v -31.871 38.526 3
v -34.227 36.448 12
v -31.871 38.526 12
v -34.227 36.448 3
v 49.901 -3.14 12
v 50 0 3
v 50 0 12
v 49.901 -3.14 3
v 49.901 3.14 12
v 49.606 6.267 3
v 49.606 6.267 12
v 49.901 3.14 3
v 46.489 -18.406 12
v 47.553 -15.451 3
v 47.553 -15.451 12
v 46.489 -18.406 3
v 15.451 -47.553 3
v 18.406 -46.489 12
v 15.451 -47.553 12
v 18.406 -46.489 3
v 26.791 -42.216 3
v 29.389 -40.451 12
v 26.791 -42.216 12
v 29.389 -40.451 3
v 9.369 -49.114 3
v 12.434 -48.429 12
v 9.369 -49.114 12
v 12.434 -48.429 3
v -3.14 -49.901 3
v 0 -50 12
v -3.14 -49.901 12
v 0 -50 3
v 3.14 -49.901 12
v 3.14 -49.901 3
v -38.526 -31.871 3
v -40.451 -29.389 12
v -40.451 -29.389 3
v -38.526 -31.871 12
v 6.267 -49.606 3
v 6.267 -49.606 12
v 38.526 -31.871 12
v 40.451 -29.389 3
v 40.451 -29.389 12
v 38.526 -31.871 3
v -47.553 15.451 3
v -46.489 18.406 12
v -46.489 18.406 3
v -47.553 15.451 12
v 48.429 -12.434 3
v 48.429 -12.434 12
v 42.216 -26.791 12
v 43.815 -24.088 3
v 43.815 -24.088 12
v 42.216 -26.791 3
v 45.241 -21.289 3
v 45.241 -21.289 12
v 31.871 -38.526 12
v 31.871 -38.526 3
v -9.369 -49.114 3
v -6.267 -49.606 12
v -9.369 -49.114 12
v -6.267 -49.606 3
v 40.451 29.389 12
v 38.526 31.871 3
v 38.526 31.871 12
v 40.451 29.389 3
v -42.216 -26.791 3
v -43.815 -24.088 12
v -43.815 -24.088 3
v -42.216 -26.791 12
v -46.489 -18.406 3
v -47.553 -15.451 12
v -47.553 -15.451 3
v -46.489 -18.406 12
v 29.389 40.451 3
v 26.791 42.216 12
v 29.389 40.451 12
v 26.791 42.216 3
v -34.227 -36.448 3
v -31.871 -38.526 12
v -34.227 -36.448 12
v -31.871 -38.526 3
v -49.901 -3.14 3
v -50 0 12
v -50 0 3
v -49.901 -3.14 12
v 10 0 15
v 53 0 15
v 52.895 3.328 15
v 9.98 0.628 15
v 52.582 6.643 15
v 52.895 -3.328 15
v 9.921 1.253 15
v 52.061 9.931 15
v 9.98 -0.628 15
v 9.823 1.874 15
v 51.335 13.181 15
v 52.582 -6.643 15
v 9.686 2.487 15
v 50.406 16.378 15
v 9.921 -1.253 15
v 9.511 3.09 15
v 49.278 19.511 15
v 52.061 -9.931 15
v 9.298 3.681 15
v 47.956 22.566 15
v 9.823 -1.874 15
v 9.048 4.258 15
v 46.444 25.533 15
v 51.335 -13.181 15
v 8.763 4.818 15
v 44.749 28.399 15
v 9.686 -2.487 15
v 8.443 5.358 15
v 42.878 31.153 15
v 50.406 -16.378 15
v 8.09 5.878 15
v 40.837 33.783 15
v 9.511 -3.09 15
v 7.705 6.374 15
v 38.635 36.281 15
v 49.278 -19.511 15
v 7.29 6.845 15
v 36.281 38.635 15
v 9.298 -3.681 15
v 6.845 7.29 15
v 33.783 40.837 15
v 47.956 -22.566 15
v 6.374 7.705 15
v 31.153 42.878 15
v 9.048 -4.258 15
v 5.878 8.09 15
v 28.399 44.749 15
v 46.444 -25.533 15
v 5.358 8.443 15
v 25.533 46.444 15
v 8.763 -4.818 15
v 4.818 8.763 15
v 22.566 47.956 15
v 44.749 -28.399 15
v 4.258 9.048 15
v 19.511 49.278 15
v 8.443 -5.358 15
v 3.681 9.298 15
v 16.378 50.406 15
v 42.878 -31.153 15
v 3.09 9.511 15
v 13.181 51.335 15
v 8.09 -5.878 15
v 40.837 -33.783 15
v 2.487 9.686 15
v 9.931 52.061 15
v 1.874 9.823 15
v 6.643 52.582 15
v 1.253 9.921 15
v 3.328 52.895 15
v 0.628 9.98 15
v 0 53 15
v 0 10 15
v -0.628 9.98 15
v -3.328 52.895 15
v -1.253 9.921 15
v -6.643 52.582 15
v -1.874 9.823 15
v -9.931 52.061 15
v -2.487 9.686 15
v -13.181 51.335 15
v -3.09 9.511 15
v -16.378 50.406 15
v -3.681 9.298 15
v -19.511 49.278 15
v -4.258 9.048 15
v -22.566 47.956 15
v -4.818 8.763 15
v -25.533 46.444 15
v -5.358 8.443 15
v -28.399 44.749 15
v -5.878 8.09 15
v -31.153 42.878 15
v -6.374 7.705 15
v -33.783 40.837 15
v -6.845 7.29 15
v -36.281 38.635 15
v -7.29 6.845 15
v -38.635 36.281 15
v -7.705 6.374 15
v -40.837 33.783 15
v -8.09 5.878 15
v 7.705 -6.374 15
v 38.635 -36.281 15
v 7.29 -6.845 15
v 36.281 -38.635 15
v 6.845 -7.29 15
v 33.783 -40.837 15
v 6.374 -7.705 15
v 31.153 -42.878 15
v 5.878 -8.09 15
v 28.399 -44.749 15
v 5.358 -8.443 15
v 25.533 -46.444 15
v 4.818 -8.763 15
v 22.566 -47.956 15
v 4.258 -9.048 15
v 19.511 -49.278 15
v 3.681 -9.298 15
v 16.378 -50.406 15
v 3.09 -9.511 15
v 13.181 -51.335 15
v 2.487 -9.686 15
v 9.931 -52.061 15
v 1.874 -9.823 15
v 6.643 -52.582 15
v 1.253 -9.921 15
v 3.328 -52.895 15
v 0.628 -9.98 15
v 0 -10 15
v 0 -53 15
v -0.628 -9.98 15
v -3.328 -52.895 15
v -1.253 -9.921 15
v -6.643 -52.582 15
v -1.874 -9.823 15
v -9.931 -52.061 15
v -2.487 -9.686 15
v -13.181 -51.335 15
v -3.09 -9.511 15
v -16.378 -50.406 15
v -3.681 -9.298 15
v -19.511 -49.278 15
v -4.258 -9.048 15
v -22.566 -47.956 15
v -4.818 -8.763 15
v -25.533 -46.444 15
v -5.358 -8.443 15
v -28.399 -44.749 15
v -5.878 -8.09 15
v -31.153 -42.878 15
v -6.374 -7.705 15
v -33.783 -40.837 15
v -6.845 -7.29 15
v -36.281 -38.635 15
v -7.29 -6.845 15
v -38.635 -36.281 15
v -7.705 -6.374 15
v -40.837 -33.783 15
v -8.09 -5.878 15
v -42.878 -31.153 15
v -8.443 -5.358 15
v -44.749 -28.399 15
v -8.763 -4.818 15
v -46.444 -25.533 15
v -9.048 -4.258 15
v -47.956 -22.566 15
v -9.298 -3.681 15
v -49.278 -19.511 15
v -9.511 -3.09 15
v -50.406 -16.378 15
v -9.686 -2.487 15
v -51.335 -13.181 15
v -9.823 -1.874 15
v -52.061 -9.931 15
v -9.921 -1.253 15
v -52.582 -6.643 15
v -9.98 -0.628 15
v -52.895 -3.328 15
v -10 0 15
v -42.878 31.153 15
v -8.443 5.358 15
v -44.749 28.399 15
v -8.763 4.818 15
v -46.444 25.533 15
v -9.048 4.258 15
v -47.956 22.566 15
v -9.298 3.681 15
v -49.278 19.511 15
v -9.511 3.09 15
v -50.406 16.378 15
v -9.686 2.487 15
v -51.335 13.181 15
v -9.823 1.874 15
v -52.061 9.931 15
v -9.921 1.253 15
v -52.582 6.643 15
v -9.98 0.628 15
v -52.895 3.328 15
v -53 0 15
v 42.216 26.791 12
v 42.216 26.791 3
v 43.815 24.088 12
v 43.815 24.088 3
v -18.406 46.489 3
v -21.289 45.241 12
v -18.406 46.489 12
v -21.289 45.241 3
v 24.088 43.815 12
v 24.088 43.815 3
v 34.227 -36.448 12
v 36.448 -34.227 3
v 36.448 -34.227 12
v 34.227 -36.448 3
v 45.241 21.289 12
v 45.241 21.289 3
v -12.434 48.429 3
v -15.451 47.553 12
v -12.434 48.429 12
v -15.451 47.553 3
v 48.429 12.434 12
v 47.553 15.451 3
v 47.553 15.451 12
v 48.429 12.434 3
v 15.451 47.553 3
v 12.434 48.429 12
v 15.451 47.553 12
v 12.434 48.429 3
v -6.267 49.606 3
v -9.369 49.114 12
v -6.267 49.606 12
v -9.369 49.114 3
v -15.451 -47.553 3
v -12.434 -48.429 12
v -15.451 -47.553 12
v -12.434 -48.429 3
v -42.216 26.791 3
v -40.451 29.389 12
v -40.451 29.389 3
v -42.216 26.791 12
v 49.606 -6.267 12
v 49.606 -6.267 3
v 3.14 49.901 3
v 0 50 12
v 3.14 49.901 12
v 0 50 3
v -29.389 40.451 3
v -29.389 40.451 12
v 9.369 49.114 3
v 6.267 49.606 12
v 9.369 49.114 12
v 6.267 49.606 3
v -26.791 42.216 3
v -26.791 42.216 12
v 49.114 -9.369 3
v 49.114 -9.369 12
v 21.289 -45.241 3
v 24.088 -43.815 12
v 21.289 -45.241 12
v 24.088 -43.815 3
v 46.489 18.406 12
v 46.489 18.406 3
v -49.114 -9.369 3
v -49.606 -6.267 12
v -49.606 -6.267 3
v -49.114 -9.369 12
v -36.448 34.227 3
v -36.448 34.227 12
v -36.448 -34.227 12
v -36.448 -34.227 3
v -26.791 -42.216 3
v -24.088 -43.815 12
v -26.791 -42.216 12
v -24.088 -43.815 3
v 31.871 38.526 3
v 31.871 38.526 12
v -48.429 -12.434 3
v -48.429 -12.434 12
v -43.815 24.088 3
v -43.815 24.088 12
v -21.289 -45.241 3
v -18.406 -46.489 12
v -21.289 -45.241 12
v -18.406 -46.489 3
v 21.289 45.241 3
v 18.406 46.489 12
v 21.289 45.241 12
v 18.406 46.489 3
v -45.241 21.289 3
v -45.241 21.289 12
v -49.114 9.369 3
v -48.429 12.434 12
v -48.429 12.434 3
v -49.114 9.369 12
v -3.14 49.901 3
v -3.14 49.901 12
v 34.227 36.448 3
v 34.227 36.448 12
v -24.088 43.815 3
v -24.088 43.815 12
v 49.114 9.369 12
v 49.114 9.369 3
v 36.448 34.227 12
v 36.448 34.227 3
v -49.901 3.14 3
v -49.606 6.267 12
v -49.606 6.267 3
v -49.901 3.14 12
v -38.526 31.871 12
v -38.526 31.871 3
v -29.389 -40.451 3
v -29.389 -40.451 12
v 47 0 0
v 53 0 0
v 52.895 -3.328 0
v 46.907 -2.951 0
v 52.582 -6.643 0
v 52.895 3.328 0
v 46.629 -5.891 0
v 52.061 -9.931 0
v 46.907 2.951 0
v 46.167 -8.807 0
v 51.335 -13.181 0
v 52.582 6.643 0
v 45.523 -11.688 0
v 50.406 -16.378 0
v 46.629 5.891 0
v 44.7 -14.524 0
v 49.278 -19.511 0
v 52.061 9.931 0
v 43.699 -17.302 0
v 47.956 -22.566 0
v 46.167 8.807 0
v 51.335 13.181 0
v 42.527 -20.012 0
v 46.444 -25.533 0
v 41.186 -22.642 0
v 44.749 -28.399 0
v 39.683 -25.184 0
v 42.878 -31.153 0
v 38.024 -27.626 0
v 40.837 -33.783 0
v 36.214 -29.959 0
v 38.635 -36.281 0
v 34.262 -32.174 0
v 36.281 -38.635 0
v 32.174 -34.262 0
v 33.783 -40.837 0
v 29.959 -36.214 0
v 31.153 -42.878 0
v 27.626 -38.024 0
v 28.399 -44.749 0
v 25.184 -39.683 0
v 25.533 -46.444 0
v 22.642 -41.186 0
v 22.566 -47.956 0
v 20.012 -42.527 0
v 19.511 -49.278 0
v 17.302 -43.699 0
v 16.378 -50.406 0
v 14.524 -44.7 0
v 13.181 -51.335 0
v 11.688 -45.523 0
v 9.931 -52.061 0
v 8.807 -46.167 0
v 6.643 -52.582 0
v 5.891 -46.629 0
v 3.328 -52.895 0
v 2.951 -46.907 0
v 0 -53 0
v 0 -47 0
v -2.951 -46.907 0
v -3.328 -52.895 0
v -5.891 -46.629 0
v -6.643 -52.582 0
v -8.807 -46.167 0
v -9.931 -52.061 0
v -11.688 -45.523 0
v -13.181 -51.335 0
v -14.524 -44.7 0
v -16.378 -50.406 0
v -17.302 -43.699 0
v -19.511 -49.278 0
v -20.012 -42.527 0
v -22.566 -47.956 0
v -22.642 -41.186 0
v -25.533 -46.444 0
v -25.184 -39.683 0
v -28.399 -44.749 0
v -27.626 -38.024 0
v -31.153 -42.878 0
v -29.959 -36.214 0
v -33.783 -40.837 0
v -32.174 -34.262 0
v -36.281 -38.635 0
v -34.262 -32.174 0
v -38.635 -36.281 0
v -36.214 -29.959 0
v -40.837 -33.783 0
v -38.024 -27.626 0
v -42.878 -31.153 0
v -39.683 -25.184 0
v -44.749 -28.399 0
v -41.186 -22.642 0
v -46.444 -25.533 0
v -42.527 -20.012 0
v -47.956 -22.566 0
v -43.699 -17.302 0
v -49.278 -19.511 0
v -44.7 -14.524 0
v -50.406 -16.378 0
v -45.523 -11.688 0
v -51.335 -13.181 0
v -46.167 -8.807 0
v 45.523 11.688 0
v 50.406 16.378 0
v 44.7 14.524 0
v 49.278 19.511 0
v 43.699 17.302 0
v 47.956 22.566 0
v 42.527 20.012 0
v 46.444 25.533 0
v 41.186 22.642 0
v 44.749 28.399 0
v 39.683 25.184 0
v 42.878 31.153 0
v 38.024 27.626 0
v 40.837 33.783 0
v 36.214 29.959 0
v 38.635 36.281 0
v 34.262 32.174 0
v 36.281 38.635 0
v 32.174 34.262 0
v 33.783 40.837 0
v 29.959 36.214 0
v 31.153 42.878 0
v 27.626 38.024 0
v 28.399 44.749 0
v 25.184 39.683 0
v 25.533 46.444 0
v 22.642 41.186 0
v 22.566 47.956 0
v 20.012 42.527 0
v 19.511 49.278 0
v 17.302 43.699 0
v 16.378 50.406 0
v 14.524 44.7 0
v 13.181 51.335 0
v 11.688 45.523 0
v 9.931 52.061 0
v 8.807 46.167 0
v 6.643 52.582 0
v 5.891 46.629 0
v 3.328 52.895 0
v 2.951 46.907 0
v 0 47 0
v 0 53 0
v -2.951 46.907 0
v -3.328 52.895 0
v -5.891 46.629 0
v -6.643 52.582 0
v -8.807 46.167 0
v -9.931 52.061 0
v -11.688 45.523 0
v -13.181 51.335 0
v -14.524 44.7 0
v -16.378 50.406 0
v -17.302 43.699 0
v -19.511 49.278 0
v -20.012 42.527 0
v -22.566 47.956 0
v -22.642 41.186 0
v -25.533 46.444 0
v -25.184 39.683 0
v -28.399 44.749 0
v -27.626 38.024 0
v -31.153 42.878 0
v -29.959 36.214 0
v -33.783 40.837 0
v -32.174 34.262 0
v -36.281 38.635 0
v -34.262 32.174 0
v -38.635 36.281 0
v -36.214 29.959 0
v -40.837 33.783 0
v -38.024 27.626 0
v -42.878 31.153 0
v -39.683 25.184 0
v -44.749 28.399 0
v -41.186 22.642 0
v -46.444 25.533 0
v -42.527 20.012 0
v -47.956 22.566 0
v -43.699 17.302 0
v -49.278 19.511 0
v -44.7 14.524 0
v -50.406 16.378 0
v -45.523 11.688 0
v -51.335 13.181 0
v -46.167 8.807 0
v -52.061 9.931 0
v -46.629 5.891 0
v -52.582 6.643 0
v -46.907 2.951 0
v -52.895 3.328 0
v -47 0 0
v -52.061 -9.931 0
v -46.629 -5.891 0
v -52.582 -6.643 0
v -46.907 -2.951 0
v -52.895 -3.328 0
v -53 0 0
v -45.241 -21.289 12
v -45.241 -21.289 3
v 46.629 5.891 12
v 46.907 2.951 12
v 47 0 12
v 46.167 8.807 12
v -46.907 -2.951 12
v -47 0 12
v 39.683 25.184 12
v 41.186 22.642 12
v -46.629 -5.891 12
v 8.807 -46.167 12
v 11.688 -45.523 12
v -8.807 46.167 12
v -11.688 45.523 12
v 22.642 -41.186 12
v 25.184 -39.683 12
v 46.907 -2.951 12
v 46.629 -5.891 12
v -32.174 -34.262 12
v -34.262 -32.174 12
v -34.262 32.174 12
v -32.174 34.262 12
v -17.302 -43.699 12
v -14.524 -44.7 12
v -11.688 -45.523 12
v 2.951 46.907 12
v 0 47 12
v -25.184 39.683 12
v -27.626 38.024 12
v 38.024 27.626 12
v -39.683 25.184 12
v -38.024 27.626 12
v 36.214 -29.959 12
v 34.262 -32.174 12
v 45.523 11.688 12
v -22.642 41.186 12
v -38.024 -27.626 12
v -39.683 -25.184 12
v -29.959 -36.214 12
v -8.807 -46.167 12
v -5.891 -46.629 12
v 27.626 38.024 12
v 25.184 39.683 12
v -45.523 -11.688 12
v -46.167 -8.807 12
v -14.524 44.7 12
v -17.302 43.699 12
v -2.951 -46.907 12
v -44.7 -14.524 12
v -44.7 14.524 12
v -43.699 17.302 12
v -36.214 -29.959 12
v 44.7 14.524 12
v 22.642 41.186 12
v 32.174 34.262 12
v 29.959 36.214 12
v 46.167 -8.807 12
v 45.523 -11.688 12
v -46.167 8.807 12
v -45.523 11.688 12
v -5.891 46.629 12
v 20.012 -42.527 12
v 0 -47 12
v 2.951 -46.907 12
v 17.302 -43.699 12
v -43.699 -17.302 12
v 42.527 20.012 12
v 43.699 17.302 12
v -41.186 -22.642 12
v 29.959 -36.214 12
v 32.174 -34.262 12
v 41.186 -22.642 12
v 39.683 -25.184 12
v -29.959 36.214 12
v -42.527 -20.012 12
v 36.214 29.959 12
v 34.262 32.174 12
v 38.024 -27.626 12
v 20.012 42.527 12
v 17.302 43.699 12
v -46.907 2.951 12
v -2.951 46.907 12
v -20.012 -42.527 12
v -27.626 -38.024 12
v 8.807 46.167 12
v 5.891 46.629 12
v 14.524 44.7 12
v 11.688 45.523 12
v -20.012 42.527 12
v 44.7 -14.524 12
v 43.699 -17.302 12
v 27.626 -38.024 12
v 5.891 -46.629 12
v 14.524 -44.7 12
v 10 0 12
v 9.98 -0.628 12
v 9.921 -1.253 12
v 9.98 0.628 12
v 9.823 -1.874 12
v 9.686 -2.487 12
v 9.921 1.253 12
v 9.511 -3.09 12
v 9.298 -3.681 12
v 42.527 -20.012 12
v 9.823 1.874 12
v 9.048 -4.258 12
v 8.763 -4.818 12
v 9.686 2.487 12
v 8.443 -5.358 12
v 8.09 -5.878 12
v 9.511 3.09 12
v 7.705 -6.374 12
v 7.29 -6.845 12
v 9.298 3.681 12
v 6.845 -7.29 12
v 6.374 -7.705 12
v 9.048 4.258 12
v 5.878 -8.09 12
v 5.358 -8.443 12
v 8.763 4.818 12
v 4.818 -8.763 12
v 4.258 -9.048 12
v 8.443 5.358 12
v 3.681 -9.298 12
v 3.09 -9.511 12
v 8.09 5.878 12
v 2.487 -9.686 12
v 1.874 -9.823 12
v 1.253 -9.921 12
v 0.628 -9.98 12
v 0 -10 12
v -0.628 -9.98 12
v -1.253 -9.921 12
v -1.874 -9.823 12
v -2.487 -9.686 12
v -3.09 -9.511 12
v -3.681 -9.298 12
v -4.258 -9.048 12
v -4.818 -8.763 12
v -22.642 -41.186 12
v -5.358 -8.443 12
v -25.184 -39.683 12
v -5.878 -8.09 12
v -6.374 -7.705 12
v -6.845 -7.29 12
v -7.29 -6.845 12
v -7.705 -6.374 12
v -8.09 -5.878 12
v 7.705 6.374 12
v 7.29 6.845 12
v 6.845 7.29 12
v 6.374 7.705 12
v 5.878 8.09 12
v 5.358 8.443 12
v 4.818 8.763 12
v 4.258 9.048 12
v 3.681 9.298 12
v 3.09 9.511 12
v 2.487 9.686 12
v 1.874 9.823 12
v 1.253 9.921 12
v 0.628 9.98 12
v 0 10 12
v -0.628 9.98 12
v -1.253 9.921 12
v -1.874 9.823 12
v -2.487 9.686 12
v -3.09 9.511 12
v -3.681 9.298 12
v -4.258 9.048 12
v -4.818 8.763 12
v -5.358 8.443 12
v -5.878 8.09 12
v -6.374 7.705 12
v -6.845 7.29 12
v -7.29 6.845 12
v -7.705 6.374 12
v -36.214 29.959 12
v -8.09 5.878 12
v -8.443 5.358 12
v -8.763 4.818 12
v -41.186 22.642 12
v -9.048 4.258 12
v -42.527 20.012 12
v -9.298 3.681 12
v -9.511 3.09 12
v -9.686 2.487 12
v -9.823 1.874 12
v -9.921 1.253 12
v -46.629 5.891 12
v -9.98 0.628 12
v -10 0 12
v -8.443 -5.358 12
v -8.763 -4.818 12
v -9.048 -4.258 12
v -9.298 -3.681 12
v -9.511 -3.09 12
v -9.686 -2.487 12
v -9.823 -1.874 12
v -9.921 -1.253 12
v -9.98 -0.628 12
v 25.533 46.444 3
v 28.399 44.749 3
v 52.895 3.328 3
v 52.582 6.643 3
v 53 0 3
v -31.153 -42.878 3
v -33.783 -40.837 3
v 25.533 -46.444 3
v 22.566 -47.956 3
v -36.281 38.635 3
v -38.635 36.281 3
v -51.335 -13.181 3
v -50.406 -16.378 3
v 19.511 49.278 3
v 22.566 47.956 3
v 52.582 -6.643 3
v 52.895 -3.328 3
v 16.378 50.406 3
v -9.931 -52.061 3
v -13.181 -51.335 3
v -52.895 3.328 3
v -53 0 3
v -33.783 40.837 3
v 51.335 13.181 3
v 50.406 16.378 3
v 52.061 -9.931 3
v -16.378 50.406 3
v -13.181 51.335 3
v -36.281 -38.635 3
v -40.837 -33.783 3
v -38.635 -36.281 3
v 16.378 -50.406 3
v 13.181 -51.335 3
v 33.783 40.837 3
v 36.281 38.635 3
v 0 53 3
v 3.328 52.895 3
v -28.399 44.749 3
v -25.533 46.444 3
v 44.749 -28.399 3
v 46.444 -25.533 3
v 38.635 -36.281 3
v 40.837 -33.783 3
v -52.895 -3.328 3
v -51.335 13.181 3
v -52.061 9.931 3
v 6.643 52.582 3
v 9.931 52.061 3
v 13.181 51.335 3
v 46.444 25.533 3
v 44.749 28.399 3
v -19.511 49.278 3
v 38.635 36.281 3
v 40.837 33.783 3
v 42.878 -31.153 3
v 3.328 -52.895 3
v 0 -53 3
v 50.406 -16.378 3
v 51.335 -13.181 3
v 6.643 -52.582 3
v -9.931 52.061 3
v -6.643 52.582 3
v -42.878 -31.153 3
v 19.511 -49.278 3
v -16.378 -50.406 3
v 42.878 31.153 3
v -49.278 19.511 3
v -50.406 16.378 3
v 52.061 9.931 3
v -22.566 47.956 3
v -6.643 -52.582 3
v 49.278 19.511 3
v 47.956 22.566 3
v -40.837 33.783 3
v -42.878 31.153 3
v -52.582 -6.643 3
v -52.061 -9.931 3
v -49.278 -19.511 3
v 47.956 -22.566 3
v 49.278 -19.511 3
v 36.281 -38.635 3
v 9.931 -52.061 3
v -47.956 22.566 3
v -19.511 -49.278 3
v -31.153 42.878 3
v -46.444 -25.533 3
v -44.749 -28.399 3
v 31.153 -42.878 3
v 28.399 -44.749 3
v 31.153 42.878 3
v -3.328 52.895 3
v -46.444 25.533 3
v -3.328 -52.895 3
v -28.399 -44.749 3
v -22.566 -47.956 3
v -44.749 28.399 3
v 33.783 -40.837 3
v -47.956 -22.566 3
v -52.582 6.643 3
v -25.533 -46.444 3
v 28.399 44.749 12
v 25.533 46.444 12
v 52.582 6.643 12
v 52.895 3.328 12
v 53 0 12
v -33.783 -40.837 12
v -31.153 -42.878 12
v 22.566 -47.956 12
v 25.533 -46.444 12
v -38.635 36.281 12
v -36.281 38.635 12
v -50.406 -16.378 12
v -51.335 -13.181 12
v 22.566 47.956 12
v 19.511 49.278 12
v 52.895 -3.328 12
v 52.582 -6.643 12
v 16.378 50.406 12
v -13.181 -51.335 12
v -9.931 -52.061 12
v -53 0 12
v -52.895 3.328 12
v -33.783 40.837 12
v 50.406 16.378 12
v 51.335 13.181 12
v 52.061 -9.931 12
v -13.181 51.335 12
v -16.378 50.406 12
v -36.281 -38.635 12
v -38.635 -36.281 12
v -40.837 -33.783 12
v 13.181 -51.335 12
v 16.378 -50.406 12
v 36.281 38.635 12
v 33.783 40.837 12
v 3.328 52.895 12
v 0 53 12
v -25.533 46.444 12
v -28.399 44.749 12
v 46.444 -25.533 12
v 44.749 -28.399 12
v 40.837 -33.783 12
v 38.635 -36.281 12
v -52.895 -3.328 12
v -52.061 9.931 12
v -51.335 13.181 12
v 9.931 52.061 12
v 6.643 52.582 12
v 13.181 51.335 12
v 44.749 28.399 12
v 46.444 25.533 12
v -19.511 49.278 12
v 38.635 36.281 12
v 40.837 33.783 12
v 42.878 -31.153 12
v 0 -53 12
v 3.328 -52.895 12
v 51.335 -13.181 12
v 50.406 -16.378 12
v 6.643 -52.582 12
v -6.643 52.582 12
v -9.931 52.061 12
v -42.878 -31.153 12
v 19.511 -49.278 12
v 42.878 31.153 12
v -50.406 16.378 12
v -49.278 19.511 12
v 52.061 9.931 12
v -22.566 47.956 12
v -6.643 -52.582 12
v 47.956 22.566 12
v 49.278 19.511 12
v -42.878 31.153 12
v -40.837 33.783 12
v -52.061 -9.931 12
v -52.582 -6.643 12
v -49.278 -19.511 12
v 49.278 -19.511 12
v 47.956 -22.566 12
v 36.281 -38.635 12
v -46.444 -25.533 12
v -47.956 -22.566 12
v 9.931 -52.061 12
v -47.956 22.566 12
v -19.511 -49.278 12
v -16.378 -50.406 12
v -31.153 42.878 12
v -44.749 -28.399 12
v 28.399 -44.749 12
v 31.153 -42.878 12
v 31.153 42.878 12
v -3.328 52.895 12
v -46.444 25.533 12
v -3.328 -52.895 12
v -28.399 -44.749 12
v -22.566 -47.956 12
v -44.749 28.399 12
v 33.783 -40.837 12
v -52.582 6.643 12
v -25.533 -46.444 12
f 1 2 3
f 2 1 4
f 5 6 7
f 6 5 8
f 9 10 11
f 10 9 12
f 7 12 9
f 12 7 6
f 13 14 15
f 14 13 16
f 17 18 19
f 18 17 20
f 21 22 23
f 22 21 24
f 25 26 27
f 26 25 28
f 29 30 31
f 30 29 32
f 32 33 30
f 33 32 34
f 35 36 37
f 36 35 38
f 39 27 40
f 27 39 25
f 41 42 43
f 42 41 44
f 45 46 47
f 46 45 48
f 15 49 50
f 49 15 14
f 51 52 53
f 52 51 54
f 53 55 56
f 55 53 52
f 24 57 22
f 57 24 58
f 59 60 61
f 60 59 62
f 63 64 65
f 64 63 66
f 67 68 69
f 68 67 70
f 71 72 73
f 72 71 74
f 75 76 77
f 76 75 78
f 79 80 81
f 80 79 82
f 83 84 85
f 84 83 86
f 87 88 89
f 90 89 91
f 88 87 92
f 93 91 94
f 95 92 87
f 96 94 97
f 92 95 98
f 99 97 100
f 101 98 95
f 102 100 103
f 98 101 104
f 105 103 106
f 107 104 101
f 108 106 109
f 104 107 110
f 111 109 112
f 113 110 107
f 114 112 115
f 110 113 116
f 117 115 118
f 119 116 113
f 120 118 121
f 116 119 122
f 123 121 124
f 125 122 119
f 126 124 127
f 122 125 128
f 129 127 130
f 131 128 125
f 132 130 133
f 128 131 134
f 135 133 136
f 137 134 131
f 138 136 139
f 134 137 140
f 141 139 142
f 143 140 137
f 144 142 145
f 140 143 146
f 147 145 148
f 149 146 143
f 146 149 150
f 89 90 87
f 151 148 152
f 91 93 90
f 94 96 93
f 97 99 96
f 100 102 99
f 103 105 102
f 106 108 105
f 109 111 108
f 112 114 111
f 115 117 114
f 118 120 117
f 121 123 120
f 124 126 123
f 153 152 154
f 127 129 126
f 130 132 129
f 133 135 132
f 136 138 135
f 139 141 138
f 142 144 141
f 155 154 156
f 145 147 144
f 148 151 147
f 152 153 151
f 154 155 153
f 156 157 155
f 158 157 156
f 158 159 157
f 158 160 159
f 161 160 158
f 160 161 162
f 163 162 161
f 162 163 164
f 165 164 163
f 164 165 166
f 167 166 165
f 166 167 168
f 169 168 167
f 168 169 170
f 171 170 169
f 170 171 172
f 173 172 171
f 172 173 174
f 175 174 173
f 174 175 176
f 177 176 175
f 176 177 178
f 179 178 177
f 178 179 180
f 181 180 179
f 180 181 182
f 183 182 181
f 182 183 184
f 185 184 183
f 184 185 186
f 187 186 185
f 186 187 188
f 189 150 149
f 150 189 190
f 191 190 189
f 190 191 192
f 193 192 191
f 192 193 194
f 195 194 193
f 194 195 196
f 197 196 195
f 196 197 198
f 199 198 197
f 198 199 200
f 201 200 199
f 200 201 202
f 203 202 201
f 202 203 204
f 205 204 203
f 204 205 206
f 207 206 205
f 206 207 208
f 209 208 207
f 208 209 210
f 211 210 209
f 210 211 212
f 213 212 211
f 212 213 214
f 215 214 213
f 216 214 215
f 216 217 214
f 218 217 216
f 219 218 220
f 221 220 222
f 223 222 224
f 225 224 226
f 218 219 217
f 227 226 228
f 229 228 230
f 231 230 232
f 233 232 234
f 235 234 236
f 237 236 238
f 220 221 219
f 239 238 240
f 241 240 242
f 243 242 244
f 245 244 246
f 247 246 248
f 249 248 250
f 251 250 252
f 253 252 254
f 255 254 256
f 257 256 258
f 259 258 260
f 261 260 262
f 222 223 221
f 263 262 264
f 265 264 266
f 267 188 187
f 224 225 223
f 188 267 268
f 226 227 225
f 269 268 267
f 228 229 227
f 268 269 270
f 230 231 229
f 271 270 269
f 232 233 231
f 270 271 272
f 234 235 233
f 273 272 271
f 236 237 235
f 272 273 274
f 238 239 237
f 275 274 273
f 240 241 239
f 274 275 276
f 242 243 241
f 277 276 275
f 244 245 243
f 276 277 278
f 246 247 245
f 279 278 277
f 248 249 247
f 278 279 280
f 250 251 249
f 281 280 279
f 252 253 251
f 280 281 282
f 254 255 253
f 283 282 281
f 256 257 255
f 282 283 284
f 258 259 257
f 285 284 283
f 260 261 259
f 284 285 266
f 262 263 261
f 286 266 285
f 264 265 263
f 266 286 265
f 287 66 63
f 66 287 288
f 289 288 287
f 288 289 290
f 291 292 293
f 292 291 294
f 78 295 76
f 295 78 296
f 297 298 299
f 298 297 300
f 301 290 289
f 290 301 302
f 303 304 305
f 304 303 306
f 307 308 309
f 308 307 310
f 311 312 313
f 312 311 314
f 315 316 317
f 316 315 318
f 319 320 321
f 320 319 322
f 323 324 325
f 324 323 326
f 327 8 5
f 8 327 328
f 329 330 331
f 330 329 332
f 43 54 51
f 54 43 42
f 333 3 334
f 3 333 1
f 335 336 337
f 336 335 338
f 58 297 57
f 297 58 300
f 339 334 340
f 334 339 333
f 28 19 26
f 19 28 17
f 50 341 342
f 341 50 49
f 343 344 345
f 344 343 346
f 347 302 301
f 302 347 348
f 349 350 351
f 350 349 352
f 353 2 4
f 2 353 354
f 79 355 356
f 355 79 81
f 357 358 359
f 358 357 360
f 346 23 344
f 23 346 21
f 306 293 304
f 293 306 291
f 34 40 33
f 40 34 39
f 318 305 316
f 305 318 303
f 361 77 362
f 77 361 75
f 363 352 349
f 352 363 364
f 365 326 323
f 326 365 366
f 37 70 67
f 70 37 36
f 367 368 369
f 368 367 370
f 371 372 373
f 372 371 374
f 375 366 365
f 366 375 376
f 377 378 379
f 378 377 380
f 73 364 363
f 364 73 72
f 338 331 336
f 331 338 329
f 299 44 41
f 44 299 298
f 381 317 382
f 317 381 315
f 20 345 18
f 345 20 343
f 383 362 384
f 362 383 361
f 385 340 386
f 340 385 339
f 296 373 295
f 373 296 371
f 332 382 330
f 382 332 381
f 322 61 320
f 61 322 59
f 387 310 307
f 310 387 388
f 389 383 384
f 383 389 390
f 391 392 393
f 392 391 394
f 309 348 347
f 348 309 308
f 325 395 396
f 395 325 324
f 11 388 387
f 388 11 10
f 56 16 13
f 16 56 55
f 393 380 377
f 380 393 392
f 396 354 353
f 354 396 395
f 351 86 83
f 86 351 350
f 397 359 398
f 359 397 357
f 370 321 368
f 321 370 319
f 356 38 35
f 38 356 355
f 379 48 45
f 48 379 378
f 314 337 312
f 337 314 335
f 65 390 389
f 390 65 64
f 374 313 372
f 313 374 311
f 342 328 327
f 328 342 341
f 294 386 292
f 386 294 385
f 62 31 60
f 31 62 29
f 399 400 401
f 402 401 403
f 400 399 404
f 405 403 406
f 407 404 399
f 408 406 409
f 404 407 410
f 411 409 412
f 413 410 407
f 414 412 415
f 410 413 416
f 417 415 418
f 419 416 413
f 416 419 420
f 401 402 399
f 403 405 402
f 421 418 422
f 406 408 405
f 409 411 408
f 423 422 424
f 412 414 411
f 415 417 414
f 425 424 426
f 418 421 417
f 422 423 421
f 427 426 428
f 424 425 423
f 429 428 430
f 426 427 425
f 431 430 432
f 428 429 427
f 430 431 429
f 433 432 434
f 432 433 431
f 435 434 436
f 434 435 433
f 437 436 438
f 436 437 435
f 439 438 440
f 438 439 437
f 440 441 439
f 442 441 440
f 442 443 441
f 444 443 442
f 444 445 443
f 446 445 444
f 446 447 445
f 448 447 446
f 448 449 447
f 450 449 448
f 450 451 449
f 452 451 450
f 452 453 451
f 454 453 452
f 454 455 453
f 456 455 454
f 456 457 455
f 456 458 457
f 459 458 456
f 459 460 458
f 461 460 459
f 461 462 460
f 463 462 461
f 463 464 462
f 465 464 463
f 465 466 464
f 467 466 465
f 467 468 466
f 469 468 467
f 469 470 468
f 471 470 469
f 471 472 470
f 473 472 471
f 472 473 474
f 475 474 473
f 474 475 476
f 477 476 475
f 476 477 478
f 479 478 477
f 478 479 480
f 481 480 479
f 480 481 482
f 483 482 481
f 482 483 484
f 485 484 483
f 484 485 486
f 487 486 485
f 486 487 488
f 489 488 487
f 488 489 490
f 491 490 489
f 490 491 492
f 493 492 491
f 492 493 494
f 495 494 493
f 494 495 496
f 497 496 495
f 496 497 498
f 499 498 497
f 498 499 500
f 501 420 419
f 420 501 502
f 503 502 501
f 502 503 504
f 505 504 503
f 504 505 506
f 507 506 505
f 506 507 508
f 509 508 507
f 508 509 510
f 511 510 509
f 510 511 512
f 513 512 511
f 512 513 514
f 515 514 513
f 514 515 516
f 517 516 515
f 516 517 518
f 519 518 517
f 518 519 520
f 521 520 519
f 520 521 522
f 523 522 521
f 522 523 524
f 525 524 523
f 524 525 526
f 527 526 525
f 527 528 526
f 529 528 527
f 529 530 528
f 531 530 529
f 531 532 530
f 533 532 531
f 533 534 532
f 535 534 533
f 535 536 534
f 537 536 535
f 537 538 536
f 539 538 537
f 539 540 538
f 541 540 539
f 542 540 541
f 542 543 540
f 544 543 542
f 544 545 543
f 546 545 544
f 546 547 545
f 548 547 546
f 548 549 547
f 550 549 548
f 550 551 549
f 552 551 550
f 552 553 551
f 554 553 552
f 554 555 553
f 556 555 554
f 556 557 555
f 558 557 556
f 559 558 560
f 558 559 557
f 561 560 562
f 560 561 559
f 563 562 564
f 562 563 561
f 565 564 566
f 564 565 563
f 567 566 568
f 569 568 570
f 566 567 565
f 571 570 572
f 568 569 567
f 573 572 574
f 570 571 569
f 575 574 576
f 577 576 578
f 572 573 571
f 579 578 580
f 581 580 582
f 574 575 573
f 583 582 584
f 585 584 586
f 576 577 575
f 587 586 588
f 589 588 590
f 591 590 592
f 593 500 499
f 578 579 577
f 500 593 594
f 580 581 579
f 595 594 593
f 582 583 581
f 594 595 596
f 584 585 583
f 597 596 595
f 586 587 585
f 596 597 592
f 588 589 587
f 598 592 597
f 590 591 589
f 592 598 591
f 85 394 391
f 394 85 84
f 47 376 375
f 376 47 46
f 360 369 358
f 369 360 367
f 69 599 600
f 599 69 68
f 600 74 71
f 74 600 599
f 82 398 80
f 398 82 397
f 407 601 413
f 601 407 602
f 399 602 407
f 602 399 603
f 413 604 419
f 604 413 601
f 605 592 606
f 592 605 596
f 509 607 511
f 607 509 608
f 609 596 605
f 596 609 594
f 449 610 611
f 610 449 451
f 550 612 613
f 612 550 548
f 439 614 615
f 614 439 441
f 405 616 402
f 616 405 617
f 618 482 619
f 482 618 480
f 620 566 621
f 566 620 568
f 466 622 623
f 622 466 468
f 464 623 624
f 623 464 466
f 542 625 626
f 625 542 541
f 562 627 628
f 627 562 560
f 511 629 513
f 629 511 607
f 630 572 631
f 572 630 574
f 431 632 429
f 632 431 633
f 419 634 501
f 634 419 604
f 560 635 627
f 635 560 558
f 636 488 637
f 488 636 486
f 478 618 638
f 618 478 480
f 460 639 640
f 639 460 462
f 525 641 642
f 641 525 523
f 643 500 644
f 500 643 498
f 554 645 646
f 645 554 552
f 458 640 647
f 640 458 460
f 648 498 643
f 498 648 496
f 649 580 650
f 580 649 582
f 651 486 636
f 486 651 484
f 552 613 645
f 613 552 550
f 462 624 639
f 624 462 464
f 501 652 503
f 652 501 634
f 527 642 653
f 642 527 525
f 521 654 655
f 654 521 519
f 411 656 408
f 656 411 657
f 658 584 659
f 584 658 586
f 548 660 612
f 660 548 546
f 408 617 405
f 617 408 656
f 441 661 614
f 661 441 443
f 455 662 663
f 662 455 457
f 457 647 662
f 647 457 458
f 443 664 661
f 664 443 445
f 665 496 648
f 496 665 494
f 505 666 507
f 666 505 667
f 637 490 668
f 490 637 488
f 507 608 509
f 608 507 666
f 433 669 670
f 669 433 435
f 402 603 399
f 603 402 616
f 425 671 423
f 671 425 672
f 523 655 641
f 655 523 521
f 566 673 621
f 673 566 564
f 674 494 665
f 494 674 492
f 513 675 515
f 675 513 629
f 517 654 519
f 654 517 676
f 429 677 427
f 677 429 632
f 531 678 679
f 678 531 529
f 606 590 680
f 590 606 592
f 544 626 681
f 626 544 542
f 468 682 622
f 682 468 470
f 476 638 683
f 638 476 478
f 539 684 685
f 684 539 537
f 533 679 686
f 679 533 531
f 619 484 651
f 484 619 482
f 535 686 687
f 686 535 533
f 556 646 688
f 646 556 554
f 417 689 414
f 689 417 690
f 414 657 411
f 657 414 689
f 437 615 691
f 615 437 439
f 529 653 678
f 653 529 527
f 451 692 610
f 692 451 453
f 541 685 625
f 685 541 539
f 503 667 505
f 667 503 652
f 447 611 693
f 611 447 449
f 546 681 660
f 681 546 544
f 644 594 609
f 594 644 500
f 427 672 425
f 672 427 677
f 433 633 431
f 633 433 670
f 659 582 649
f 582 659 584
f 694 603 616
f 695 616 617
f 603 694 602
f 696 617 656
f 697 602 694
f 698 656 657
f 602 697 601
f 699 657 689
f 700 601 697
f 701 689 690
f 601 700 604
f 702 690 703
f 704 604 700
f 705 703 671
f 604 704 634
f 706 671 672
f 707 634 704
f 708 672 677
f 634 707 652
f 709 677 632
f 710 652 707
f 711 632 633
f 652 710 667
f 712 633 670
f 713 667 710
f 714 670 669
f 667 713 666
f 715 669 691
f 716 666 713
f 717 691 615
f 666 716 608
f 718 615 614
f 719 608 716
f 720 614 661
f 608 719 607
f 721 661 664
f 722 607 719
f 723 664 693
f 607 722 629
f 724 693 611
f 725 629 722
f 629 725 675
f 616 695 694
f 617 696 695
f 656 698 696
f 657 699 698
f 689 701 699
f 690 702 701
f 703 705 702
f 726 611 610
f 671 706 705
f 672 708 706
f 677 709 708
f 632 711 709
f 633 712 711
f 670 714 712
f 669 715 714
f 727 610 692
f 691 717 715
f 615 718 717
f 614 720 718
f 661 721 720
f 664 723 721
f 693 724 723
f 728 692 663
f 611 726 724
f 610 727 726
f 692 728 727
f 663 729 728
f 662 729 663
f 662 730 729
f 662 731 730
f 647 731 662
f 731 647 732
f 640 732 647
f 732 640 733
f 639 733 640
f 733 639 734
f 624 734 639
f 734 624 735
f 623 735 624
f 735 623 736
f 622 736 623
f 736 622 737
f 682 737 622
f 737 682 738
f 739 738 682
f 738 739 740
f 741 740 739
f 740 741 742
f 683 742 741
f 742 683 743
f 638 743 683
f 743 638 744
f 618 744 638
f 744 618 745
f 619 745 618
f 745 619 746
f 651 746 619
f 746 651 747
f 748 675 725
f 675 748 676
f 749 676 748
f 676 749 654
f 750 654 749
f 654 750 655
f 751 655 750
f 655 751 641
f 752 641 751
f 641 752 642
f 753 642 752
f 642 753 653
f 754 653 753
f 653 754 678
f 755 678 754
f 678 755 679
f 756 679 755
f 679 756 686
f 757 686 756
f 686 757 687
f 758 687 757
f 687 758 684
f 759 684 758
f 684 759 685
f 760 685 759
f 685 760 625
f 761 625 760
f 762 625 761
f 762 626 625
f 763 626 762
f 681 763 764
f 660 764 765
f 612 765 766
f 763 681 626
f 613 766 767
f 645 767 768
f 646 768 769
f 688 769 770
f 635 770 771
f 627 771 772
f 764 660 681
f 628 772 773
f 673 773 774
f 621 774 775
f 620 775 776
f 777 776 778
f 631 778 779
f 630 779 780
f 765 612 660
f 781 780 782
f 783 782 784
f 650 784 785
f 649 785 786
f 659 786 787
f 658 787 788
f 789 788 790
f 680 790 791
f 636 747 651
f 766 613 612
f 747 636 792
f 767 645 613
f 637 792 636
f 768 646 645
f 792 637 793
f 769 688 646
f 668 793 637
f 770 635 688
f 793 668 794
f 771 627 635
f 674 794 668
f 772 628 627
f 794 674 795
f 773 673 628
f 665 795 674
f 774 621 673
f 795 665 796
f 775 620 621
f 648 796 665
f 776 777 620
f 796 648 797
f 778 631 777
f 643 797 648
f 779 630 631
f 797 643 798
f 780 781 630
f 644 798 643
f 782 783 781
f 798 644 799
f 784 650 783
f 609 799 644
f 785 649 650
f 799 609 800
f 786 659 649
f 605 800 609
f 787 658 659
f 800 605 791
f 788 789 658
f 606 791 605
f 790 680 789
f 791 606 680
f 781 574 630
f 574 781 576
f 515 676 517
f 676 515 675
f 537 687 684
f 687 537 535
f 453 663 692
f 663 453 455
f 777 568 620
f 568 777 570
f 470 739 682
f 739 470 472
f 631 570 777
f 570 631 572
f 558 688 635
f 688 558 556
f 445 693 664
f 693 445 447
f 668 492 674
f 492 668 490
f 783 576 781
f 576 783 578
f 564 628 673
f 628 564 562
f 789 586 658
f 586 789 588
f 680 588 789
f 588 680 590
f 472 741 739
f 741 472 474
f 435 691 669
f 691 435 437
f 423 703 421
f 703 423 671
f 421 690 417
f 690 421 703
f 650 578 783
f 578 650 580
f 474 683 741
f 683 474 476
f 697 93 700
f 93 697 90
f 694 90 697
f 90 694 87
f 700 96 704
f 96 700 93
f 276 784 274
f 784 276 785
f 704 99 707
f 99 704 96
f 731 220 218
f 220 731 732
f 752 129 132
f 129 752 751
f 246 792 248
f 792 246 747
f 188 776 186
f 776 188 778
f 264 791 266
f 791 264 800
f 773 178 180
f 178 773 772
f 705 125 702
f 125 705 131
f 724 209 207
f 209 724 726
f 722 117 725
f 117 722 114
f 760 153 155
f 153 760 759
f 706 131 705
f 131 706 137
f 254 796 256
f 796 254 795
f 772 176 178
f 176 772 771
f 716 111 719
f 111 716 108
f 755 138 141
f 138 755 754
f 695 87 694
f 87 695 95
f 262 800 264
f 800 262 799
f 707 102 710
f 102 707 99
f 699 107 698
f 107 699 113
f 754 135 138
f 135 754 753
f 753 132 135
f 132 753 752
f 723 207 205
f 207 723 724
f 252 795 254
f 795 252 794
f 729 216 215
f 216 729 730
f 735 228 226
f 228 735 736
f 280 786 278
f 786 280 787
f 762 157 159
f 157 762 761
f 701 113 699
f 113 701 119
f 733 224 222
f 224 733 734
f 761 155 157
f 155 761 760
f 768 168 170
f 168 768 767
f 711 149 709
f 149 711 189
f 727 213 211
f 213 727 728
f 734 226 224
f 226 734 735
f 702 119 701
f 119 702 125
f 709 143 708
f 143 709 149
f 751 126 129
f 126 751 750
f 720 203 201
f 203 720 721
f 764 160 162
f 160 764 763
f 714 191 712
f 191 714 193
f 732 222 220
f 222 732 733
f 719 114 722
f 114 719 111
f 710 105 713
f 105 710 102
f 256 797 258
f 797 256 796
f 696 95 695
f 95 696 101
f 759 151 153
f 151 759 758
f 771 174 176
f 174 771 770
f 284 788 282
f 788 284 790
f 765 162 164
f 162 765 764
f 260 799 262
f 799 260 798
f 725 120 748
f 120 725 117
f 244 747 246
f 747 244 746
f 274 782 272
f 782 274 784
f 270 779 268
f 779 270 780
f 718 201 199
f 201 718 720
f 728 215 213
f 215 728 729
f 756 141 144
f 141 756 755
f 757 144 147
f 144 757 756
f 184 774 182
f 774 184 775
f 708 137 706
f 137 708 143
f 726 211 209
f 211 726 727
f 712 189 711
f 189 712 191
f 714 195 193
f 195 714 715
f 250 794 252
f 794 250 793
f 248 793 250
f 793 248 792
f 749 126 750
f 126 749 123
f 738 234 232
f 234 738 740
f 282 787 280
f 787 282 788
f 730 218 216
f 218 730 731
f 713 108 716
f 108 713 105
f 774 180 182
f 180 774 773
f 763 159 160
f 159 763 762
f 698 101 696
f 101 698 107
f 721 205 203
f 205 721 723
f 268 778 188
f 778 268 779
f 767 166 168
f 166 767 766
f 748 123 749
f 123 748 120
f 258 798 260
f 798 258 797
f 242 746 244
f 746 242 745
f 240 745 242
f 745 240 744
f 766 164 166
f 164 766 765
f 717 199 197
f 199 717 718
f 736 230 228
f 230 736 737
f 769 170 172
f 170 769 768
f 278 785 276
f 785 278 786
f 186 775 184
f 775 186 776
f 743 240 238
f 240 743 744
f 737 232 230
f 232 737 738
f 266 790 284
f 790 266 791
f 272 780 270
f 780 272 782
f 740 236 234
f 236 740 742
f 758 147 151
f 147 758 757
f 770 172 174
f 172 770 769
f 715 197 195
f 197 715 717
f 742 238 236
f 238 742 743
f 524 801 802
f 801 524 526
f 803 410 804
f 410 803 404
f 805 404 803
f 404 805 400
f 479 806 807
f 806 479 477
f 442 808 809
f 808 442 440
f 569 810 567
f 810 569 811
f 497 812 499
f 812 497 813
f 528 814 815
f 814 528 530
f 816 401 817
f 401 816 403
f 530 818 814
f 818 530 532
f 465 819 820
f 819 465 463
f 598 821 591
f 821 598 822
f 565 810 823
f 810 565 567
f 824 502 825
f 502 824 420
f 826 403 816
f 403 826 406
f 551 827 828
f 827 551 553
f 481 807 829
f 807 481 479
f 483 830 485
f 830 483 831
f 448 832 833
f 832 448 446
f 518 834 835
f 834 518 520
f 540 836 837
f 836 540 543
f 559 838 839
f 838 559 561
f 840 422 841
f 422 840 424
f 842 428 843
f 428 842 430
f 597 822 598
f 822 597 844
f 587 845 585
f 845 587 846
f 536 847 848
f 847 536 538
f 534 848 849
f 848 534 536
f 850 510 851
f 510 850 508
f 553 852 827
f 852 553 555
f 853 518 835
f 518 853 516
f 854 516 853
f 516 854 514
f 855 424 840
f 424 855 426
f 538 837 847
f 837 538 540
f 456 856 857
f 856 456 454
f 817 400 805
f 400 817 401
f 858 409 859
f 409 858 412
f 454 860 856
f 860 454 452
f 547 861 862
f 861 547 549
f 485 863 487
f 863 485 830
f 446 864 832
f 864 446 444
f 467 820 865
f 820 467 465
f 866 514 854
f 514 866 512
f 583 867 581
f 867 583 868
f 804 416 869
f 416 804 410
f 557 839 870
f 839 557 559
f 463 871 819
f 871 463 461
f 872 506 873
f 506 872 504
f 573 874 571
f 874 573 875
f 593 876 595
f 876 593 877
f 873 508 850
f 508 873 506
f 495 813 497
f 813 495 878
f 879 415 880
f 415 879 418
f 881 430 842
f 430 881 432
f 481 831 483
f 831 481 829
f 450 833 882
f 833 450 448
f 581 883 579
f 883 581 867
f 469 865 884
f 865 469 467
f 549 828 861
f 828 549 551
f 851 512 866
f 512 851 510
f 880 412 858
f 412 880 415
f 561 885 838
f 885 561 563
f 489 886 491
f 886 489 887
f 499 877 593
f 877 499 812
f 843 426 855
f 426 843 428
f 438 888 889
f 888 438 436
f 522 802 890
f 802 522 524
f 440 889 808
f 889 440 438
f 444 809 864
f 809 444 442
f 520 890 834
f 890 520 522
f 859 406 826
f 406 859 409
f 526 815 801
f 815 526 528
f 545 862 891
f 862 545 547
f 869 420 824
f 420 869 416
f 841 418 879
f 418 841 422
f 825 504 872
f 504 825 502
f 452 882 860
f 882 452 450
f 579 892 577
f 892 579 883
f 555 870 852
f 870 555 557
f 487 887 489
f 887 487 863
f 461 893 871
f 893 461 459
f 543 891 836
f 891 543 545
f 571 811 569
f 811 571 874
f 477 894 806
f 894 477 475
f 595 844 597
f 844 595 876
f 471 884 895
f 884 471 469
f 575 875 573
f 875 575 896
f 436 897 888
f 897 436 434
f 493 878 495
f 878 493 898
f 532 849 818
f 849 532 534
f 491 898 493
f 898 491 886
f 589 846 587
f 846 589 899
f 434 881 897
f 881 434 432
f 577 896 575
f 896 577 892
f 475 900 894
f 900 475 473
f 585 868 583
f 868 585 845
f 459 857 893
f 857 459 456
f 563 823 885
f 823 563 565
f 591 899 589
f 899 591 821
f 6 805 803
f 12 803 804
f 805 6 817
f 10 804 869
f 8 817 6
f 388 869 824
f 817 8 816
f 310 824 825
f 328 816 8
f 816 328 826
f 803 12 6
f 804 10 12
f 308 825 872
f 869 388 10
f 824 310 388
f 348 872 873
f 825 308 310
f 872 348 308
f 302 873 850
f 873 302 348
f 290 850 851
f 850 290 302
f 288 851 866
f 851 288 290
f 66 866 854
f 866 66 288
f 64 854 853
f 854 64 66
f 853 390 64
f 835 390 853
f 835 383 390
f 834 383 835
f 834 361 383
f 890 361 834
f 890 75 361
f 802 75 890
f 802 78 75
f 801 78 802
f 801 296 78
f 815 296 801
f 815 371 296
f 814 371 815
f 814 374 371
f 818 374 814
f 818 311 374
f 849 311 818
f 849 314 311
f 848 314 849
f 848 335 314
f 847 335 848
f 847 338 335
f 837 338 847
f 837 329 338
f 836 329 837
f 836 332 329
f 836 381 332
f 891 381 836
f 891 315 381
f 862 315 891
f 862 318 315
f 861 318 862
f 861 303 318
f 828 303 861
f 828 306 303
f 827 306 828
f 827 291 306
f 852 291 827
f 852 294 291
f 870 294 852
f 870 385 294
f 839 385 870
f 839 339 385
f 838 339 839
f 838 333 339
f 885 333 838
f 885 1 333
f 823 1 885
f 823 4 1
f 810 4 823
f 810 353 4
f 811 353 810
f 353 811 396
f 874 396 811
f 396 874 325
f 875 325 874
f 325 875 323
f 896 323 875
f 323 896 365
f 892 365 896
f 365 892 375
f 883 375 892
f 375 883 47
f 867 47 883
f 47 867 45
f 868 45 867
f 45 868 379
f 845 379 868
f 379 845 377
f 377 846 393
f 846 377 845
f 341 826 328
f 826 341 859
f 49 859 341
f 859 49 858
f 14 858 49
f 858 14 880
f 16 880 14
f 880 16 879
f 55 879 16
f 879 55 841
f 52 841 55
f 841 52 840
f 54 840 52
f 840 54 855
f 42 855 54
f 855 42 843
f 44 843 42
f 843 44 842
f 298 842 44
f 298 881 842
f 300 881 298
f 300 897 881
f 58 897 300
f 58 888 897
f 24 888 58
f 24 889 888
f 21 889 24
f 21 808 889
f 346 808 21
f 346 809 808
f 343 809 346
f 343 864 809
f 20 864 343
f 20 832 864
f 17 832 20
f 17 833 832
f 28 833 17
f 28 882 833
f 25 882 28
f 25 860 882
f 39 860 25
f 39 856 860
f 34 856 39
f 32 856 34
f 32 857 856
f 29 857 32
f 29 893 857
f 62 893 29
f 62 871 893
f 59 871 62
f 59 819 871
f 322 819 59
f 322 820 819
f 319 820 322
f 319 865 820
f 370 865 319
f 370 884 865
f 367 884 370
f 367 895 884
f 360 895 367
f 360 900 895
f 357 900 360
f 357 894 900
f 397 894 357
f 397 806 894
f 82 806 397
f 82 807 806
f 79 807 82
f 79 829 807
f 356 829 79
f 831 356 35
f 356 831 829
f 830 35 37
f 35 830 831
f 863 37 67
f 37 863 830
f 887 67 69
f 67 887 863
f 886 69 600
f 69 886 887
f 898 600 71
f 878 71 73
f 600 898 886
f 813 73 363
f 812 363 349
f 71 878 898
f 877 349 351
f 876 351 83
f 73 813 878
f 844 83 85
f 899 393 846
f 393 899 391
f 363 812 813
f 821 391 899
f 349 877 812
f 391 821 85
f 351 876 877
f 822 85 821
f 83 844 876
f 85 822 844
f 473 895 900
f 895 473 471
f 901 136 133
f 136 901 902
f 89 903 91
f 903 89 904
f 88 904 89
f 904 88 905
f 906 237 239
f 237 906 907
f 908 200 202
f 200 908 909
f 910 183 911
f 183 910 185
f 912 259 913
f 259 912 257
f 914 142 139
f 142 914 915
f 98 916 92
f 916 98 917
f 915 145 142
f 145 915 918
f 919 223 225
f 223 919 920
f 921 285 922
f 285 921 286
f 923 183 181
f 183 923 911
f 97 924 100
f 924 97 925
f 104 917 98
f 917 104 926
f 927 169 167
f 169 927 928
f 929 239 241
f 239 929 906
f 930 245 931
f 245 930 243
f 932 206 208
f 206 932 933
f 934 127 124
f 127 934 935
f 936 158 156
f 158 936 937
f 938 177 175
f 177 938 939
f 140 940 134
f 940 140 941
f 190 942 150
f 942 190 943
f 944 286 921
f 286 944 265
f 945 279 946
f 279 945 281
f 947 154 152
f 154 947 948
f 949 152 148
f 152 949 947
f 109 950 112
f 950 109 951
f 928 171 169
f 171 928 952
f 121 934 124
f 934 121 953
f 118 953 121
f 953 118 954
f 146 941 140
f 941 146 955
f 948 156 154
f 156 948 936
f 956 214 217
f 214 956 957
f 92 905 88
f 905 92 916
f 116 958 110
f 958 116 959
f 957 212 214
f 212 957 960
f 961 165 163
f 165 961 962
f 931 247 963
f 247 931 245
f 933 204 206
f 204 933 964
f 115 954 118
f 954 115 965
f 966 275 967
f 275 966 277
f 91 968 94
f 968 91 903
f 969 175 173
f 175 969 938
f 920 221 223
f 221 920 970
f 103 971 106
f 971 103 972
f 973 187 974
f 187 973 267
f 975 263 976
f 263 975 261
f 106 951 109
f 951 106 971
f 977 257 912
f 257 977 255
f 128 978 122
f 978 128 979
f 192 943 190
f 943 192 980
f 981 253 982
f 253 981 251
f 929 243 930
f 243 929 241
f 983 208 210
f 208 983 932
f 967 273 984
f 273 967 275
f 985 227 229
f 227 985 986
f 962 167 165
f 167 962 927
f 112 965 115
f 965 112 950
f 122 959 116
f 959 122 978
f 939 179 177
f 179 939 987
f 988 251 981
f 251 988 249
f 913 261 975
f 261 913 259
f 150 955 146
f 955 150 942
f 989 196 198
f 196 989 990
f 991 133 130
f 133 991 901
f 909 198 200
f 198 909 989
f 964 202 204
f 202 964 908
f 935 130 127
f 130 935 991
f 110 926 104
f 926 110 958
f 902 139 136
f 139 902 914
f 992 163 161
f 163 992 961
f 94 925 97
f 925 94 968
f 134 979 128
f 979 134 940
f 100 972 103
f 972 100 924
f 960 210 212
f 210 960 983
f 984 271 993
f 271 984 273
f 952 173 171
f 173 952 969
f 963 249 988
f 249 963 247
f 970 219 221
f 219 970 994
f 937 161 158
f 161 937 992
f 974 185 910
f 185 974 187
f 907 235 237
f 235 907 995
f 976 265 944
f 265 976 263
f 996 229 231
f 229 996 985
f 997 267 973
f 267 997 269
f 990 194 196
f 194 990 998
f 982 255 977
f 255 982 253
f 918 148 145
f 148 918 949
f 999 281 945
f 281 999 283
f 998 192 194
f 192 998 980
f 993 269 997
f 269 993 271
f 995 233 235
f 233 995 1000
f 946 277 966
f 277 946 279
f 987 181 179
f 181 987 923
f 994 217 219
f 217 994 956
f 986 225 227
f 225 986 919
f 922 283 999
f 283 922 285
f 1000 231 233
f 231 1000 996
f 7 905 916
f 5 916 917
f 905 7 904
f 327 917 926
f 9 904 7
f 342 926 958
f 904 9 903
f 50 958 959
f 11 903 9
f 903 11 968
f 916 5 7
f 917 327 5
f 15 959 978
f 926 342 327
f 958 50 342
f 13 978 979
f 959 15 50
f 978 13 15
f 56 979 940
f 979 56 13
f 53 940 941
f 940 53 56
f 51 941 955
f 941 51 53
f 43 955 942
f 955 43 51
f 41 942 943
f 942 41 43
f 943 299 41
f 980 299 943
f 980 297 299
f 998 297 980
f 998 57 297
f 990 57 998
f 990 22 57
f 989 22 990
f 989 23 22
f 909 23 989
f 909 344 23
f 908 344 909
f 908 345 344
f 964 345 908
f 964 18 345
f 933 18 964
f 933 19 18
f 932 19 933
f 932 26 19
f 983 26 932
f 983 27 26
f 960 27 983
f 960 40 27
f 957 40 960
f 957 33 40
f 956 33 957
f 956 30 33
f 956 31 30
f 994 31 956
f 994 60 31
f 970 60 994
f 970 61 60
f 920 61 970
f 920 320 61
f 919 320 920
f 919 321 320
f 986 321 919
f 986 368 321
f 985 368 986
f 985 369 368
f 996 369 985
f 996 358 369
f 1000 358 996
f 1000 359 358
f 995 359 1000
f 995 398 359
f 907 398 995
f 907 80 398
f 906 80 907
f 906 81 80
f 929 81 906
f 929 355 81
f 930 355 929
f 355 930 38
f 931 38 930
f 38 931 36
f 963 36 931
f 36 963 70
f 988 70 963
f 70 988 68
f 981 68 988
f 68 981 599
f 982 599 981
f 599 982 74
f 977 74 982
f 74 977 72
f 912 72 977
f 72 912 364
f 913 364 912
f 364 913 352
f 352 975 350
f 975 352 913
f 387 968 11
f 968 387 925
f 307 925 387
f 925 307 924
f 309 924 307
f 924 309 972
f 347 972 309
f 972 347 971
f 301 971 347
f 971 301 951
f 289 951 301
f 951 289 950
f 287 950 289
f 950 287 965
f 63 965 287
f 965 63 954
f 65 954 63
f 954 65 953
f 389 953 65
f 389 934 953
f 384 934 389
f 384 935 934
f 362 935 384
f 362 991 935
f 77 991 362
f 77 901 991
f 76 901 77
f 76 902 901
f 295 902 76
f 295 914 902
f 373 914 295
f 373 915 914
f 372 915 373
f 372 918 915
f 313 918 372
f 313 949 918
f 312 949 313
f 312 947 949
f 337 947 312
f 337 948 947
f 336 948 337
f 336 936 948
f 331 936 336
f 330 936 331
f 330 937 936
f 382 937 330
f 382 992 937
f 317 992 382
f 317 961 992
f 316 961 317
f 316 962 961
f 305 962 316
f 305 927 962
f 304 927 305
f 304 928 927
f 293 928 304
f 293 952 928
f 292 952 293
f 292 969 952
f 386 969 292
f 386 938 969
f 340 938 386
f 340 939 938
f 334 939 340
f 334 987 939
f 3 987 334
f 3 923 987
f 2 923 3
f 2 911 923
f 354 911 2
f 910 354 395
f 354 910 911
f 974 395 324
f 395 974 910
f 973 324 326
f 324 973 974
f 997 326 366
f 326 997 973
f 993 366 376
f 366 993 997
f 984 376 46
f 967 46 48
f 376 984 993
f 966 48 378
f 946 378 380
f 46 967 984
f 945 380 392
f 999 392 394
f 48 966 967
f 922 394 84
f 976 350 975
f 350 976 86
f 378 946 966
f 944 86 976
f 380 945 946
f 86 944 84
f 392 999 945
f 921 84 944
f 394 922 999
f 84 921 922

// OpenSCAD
pulleyDepth = 15;
pulleyRadius = 50;
pulleyResolution = 100;
pulleyRimDepth = 3;
pulleyWebDepth = 3;

union() {
	difference() {
		cylinder(h=pulleyDepth,r1=pulleyRadius,r2=pulleyRadius,$fn=pulleyResolution);
		cylinder(h=pulleyDepth-pulleyWebDepth,r1=pulleyRadius-pulleyRimDepth,r2=pulleyRadius-pulleyRimDepth,$fn=pulleyResolution);
		cylinder(h=pulleyDepth,r1=10,r2=10,$fn=pulleyResolution);
	}
	difference() {
		cylinder(h=pulleyWebDepth,r1=pulleyRadius+pulleyWebDepth,r2=pulleyRadius+pulleyWebDepth,$fn=pulleyResolution);
		cylinder(h=pulleyWebDepth,r1=pulleyRadius-pulleyWebDepth,r2=pulleyRadius-pulleyWebDepth,$fn=pulleyResolution);
	}
	translate([0,0,pulleyDepth-pulleyWebDepth]) {
		difference() {
			cylinder(h=pulleyWebDepth,r1=pulleyRadius+pulleyWebDepth,r2=pulleyRadius+pulleyWebDepth,$fn=pulleyResolution);
			cylinder(h=pulleyWebDepth,r1=pulleyRadius-pulleyWebDepth,r2=pulleyRadius-pulleyWebDepth,$fn=pulleyResolution);
		}
	}
}
